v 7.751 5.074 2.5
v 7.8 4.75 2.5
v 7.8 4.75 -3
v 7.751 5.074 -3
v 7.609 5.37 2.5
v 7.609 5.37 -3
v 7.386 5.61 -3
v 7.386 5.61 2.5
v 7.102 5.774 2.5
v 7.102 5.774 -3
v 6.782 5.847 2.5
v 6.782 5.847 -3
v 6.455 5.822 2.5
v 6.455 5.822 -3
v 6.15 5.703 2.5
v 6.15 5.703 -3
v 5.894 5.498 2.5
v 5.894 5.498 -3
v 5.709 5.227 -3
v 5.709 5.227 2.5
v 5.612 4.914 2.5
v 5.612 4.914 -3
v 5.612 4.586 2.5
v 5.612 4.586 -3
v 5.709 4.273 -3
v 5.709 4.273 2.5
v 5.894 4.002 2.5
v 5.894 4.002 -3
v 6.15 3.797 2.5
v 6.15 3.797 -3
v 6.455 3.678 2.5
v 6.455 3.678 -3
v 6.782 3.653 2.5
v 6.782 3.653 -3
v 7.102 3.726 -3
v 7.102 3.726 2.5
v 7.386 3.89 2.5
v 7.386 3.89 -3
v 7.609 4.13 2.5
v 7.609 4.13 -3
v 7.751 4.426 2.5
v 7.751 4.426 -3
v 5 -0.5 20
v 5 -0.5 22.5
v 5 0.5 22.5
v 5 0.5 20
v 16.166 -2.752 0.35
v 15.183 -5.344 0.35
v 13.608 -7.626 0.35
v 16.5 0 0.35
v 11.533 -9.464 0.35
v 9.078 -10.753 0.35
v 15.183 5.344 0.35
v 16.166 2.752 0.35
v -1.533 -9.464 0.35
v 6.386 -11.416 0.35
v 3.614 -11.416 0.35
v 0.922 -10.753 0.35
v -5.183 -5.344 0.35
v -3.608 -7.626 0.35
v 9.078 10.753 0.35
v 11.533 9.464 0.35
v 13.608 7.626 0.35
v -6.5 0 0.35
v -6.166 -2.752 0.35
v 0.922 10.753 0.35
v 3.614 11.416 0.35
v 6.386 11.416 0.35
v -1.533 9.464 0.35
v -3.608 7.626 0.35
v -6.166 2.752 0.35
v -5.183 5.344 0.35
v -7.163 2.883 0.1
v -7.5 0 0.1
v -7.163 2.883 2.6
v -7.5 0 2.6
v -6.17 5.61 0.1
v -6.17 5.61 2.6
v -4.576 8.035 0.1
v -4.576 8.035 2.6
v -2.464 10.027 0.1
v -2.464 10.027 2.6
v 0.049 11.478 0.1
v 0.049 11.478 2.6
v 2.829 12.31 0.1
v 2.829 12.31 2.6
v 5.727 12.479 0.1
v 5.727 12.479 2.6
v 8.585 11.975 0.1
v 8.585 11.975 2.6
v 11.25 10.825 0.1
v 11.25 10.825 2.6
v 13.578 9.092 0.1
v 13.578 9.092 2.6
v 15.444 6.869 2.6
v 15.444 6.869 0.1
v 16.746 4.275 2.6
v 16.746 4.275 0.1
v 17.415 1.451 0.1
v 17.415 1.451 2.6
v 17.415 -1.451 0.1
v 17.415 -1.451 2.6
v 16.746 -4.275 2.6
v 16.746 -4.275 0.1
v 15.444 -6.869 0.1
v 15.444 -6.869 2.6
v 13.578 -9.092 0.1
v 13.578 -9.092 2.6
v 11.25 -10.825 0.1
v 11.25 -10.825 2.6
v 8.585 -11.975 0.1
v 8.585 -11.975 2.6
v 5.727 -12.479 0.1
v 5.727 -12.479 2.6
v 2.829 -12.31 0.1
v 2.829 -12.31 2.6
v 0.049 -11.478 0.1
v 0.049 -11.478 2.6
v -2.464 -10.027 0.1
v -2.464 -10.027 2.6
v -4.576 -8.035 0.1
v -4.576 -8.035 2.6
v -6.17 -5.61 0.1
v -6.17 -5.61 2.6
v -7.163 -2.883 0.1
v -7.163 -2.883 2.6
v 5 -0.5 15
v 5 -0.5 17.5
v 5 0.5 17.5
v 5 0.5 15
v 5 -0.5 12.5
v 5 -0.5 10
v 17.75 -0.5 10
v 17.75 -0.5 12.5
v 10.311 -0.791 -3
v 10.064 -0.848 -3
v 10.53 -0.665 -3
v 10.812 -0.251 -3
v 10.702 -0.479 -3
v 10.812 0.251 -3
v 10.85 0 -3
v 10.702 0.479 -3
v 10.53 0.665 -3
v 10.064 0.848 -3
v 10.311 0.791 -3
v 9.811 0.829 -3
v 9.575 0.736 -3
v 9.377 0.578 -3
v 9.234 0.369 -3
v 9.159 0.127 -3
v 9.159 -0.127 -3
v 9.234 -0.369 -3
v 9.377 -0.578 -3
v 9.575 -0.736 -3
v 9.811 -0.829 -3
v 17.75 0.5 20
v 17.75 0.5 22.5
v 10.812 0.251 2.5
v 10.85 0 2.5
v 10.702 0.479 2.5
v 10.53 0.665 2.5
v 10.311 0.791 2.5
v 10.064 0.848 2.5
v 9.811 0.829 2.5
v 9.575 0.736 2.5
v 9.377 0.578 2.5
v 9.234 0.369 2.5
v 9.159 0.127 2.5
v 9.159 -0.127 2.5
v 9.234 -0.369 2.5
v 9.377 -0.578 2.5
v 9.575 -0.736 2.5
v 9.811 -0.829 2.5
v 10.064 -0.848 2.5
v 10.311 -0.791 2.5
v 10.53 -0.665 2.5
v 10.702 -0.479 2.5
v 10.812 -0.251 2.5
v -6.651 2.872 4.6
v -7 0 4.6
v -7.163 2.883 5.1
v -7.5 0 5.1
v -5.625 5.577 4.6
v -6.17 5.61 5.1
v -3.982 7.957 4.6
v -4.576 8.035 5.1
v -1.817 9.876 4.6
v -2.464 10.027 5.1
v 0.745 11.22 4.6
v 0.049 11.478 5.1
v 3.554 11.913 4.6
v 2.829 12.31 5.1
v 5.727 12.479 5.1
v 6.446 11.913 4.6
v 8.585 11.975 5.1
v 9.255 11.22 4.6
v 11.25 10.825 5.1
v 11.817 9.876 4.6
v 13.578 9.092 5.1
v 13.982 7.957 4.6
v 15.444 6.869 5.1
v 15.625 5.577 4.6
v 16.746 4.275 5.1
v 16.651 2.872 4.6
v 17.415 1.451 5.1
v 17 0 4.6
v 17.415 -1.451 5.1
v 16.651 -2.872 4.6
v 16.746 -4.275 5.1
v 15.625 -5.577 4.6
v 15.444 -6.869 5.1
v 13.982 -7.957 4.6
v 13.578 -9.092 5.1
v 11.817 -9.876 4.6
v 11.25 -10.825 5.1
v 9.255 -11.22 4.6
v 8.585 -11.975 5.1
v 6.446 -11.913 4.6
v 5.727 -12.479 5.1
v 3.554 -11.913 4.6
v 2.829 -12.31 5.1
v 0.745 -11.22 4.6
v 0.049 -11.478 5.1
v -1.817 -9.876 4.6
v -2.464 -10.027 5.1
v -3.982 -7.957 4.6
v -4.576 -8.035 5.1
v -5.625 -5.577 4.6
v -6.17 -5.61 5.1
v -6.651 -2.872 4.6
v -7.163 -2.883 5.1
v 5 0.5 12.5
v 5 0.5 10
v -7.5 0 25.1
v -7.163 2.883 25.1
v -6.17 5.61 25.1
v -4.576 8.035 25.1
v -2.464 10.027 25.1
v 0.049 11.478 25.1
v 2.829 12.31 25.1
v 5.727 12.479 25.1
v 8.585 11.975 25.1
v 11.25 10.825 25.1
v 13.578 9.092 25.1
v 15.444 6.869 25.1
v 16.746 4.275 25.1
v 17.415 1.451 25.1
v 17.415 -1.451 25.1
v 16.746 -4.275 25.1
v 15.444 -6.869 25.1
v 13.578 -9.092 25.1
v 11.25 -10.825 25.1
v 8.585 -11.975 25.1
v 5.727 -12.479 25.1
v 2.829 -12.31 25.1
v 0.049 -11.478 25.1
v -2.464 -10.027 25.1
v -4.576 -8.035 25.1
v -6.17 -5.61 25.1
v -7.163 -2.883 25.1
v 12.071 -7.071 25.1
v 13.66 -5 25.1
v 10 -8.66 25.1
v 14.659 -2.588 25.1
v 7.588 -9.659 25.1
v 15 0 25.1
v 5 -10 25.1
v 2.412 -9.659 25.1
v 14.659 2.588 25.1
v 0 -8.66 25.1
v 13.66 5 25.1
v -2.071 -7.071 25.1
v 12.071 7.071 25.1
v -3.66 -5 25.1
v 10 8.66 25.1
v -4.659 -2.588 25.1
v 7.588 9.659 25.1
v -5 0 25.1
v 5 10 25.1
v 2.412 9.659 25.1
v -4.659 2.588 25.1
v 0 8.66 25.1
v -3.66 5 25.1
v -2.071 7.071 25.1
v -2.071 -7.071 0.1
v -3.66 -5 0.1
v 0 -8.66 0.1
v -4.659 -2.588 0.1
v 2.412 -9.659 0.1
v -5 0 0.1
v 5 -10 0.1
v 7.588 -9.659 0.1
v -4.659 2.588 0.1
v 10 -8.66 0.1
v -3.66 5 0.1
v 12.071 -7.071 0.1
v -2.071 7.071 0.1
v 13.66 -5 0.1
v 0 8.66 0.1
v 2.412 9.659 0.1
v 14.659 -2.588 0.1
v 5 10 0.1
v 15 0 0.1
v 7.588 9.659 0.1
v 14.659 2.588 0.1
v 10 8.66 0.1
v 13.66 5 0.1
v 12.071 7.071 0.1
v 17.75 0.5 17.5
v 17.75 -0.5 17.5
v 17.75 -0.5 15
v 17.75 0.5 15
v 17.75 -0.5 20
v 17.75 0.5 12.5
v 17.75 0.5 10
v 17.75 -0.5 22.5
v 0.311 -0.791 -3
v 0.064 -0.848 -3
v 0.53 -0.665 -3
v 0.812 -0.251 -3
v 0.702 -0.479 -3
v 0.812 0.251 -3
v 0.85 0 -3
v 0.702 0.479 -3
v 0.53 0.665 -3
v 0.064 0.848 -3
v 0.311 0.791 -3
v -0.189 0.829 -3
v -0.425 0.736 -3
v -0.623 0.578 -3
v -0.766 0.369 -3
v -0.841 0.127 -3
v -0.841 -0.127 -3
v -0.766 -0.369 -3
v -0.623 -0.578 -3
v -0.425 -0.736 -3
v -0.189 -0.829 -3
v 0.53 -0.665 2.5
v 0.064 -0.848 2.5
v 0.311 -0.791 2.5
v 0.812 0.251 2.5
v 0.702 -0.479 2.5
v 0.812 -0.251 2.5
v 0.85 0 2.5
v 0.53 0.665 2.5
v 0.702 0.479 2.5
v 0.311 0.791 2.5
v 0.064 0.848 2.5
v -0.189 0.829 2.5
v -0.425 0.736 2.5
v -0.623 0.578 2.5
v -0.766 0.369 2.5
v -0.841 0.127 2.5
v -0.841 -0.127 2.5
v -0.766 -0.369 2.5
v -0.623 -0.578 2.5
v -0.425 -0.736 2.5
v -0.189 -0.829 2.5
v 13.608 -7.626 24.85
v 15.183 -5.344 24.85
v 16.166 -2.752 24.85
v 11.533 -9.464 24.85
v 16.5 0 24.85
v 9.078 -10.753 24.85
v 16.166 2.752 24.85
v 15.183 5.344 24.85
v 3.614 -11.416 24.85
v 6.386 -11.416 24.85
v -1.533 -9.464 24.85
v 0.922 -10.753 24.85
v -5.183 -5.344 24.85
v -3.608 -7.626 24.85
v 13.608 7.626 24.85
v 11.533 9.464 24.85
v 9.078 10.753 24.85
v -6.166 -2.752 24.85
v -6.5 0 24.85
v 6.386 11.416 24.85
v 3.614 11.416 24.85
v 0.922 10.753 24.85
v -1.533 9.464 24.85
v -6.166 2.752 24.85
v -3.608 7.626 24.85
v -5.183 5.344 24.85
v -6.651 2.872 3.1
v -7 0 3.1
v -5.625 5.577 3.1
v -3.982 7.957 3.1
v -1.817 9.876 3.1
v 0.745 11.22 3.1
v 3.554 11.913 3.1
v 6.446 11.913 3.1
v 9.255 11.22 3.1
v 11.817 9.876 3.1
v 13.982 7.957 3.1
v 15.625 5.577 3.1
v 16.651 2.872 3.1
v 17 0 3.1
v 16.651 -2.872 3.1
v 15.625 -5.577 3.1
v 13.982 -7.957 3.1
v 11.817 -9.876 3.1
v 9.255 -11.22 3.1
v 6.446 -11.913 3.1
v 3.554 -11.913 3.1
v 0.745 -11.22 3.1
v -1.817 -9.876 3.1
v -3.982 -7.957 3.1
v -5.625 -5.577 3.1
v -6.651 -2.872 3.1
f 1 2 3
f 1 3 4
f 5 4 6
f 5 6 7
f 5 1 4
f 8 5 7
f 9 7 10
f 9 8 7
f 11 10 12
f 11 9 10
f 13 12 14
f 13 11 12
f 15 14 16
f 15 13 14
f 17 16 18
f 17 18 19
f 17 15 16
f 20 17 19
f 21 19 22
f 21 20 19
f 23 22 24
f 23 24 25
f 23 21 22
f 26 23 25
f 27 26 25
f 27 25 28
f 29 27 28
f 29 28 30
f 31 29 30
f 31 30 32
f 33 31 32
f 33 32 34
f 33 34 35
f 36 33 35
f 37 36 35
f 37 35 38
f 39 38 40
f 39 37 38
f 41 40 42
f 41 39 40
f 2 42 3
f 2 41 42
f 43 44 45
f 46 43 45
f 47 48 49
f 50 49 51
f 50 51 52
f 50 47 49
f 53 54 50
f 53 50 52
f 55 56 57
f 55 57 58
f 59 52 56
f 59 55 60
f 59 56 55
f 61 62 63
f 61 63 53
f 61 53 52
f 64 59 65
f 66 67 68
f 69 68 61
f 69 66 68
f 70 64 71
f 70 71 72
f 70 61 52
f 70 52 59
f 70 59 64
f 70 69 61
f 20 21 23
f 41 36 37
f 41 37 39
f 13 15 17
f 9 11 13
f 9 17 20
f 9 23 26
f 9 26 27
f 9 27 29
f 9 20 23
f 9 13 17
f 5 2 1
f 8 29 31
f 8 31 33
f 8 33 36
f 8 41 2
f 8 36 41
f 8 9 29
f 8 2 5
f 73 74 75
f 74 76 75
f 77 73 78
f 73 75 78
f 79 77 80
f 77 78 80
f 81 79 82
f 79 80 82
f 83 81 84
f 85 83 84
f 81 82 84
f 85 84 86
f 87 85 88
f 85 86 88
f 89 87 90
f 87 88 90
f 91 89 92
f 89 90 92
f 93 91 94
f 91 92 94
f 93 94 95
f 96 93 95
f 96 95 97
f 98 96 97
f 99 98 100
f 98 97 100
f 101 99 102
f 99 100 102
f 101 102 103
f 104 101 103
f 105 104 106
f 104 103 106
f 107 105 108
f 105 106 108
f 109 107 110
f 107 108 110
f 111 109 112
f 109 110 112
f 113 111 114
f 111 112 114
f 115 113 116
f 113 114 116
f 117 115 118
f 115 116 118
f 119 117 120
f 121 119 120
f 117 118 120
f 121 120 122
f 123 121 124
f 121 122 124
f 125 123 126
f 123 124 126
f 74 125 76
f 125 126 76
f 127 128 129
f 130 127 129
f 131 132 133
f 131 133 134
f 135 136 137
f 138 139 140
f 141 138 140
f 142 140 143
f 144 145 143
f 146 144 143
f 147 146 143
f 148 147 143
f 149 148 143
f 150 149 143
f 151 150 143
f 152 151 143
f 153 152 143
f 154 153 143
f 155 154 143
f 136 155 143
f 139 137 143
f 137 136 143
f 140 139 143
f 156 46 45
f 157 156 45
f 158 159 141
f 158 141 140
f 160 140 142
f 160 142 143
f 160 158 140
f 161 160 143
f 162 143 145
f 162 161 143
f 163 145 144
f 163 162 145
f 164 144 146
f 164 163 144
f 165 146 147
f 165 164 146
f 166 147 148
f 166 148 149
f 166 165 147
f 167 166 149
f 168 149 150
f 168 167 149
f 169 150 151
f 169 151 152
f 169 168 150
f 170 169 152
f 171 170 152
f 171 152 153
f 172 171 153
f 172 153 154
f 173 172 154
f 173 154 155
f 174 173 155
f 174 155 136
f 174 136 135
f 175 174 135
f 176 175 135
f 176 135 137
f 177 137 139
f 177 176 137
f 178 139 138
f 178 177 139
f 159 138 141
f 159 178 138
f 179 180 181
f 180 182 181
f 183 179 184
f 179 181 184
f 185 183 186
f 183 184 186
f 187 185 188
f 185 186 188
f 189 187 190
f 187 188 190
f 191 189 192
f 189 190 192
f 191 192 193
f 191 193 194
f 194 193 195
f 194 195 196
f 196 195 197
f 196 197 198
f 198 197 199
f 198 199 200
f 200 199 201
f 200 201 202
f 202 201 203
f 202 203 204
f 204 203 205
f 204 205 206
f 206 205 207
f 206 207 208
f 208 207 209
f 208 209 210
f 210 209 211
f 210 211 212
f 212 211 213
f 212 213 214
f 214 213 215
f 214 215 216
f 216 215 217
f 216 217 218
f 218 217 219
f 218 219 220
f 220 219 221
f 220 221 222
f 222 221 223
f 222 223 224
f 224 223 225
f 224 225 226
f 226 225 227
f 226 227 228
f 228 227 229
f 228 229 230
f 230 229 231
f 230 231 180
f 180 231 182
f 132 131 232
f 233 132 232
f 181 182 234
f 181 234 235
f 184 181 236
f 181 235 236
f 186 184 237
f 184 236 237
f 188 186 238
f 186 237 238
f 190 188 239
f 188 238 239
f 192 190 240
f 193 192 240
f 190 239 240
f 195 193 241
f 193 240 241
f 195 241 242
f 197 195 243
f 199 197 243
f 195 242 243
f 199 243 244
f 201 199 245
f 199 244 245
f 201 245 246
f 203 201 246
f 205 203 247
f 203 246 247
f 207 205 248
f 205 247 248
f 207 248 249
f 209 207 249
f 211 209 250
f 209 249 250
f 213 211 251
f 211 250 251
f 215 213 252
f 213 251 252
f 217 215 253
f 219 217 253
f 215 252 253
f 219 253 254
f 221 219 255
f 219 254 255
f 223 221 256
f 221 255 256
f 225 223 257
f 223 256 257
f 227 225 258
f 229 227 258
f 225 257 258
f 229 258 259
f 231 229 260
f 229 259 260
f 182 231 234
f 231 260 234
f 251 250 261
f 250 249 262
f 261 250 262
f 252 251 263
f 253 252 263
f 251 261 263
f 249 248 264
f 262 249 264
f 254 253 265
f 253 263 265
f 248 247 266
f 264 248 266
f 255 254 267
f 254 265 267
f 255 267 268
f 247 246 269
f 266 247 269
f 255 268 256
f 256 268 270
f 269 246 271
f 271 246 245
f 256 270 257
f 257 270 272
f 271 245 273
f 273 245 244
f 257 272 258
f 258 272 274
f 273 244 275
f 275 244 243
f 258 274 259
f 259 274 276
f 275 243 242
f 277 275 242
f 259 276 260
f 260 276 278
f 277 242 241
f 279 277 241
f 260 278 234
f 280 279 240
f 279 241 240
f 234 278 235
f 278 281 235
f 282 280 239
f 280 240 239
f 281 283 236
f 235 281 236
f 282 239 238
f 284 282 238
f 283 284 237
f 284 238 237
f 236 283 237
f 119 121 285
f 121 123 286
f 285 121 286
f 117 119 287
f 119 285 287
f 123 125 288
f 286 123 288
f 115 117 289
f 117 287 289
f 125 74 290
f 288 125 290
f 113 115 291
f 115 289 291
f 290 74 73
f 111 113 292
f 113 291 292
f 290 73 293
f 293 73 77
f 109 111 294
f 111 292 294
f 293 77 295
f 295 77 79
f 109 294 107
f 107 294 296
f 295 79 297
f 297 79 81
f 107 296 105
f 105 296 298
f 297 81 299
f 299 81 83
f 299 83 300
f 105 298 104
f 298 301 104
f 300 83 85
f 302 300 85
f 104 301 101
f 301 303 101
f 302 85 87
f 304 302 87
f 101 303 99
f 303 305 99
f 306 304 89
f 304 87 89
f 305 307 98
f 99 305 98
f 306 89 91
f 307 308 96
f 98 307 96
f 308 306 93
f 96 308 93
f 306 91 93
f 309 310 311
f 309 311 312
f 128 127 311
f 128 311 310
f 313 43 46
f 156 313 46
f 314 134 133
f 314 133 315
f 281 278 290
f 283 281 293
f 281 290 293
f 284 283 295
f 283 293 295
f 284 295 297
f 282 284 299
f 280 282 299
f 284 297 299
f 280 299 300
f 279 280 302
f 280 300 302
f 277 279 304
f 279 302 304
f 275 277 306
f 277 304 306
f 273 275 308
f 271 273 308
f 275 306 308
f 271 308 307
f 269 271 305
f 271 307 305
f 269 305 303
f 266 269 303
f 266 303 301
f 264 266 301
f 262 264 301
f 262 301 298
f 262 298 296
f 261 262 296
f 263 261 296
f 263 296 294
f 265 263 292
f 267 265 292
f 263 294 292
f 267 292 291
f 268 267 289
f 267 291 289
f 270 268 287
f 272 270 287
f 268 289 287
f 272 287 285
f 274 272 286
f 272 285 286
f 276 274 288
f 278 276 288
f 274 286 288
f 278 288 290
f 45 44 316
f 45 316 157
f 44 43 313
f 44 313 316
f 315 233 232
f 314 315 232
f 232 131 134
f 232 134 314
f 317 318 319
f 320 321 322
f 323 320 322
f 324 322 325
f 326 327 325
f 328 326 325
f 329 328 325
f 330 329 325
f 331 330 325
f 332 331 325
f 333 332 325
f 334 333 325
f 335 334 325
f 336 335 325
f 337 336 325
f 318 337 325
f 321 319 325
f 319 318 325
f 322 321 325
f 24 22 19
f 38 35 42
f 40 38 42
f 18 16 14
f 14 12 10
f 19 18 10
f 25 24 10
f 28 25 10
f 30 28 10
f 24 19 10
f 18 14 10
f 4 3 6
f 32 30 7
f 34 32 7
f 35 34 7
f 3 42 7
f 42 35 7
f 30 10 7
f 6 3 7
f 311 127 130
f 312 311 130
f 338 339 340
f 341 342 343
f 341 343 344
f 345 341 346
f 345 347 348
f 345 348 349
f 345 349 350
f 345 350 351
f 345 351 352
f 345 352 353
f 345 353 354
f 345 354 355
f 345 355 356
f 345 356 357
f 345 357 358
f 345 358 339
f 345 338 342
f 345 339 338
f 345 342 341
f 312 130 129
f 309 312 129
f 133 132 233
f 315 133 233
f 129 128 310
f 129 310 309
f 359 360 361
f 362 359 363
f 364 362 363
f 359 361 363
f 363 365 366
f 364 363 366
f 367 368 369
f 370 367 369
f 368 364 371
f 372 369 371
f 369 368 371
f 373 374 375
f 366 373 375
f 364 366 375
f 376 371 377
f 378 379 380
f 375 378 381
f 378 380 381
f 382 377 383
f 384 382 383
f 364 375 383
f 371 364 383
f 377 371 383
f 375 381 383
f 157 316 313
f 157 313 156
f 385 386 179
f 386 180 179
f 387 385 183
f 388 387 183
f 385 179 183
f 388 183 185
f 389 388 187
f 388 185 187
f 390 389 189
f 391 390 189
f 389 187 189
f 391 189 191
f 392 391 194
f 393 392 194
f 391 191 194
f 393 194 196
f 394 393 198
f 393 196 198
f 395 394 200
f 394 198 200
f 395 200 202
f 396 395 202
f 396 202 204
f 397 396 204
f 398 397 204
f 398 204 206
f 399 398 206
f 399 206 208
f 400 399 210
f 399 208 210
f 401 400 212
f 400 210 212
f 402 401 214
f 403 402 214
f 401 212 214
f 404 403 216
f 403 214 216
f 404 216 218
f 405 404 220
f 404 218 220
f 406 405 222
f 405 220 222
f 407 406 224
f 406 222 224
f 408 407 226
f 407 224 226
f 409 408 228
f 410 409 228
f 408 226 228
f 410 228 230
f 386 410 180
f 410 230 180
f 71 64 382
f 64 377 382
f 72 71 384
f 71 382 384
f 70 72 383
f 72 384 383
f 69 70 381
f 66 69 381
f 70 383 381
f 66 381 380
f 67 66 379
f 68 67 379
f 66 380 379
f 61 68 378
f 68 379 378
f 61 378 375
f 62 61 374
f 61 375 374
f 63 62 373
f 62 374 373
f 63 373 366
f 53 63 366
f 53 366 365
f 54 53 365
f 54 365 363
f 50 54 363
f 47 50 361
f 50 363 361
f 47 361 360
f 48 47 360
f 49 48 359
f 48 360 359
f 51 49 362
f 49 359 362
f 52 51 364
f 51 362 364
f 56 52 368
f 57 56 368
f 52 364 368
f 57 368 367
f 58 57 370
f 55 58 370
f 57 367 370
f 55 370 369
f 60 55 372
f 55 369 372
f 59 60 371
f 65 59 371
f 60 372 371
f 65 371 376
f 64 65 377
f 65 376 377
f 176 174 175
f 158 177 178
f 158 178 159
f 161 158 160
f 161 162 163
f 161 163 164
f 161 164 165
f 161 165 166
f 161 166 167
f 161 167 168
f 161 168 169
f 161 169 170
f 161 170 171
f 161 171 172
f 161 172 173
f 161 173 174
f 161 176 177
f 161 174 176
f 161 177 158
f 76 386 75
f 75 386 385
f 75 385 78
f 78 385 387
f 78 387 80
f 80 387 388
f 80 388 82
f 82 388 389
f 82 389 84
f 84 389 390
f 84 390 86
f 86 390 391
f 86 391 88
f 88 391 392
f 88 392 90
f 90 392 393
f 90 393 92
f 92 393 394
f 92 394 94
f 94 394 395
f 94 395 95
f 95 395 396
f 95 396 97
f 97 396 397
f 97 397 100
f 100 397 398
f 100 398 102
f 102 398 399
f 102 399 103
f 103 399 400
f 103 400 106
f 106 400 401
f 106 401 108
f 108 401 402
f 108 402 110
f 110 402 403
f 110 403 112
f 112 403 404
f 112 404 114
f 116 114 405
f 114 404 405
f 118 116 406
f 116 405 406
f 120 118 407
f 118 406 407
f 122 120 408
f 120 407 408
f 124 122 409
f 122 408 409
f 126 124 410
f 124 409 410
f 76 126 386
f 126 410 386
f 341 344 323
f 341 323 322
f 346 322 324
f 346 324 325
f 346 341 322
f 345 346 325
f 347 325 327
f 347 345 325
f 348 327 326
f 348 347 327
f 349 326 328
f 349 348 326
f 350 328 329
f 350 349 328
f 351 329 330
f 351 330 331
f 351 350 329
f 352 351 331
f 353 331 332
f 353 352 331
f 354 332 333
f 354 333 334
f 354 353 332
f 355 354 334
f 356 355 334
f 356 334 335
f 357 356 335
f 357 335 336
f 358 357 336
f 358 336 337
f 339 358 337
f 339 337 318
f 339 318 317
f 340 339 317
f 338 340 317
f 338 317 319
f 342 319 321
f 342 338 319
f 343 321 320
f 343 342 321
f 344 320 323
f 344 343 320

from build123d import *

# Parameters (mm, degrees)
SKETCH002_W   = 11.5
SKETCH002_H   = 24.5
SKETCH003_R   = 0.85
SKETCH003_R_2 = 1.1
PAD_DEPTH     = 5.5
SKETCH004_W   = 1
SKETCH004_H   = 2.5
PAD001_DEPTH  = 12.75


with BuildPart() as revolution:
    # Sketch → Revolution (revolve)
    with BuildSketch(Plane.XZ):
        Polygon((-7.5, 0.1), (-7.5, 2.6), (-7, 3.1), (-7, 4.6), (-7.5, 5.1), (-7.5, 25.1), (-5, 25.1), (-5, 0.1), align=None)
    revolve(axis=Axis((5, 0, 7.548619), (0, 0, -1)))


with BuildPart() as revolution001:
    # Sketch002 → Revolution001 (revolve)
    with BuildSketch(Plane.XZ):
        with Locations((-0.75, 12.6)):
            Rectangle(SKETCH002_W, SKETCH002_H)
    revolve(axis=Axis((5, 0, 4.680116), (0, 0, -1)))


with BuildPart() as pad:
    # Sketch003 → Pad (new body)
    with BuildSketch(Plane.XY.offset(2.5)):
        Circle(SKETCH003_R)
        with Locations((10, 0)):
            Circle(SKETCH003_R)
        with Locations((6.7, 4.75)):
            Circle(SKETCH003_R_2)
    extrude(amount=-PAD_DEPTH)


with BuildPart() as pad001:
    # Sketch004 → Pad001 (new body)
    with BuildSketch(Plane.YZ.offset(5)):
        with Locations((0, 11.25)):
            Rectangle(SKETCH004_W, SKETCH004_H)
        with Locations((0, 16.25)):
            Rectangle(SKETCH004_W, SKETCH004_H)
        with Locations((0, 21.25)):
            Rectangle(SKETCH004_W, SKETCH004_H)
    extrude(amount=PAD001_DEPTH)


solid = Compound([revolution.part, revolution001.part, pad.part, pad001.part])
